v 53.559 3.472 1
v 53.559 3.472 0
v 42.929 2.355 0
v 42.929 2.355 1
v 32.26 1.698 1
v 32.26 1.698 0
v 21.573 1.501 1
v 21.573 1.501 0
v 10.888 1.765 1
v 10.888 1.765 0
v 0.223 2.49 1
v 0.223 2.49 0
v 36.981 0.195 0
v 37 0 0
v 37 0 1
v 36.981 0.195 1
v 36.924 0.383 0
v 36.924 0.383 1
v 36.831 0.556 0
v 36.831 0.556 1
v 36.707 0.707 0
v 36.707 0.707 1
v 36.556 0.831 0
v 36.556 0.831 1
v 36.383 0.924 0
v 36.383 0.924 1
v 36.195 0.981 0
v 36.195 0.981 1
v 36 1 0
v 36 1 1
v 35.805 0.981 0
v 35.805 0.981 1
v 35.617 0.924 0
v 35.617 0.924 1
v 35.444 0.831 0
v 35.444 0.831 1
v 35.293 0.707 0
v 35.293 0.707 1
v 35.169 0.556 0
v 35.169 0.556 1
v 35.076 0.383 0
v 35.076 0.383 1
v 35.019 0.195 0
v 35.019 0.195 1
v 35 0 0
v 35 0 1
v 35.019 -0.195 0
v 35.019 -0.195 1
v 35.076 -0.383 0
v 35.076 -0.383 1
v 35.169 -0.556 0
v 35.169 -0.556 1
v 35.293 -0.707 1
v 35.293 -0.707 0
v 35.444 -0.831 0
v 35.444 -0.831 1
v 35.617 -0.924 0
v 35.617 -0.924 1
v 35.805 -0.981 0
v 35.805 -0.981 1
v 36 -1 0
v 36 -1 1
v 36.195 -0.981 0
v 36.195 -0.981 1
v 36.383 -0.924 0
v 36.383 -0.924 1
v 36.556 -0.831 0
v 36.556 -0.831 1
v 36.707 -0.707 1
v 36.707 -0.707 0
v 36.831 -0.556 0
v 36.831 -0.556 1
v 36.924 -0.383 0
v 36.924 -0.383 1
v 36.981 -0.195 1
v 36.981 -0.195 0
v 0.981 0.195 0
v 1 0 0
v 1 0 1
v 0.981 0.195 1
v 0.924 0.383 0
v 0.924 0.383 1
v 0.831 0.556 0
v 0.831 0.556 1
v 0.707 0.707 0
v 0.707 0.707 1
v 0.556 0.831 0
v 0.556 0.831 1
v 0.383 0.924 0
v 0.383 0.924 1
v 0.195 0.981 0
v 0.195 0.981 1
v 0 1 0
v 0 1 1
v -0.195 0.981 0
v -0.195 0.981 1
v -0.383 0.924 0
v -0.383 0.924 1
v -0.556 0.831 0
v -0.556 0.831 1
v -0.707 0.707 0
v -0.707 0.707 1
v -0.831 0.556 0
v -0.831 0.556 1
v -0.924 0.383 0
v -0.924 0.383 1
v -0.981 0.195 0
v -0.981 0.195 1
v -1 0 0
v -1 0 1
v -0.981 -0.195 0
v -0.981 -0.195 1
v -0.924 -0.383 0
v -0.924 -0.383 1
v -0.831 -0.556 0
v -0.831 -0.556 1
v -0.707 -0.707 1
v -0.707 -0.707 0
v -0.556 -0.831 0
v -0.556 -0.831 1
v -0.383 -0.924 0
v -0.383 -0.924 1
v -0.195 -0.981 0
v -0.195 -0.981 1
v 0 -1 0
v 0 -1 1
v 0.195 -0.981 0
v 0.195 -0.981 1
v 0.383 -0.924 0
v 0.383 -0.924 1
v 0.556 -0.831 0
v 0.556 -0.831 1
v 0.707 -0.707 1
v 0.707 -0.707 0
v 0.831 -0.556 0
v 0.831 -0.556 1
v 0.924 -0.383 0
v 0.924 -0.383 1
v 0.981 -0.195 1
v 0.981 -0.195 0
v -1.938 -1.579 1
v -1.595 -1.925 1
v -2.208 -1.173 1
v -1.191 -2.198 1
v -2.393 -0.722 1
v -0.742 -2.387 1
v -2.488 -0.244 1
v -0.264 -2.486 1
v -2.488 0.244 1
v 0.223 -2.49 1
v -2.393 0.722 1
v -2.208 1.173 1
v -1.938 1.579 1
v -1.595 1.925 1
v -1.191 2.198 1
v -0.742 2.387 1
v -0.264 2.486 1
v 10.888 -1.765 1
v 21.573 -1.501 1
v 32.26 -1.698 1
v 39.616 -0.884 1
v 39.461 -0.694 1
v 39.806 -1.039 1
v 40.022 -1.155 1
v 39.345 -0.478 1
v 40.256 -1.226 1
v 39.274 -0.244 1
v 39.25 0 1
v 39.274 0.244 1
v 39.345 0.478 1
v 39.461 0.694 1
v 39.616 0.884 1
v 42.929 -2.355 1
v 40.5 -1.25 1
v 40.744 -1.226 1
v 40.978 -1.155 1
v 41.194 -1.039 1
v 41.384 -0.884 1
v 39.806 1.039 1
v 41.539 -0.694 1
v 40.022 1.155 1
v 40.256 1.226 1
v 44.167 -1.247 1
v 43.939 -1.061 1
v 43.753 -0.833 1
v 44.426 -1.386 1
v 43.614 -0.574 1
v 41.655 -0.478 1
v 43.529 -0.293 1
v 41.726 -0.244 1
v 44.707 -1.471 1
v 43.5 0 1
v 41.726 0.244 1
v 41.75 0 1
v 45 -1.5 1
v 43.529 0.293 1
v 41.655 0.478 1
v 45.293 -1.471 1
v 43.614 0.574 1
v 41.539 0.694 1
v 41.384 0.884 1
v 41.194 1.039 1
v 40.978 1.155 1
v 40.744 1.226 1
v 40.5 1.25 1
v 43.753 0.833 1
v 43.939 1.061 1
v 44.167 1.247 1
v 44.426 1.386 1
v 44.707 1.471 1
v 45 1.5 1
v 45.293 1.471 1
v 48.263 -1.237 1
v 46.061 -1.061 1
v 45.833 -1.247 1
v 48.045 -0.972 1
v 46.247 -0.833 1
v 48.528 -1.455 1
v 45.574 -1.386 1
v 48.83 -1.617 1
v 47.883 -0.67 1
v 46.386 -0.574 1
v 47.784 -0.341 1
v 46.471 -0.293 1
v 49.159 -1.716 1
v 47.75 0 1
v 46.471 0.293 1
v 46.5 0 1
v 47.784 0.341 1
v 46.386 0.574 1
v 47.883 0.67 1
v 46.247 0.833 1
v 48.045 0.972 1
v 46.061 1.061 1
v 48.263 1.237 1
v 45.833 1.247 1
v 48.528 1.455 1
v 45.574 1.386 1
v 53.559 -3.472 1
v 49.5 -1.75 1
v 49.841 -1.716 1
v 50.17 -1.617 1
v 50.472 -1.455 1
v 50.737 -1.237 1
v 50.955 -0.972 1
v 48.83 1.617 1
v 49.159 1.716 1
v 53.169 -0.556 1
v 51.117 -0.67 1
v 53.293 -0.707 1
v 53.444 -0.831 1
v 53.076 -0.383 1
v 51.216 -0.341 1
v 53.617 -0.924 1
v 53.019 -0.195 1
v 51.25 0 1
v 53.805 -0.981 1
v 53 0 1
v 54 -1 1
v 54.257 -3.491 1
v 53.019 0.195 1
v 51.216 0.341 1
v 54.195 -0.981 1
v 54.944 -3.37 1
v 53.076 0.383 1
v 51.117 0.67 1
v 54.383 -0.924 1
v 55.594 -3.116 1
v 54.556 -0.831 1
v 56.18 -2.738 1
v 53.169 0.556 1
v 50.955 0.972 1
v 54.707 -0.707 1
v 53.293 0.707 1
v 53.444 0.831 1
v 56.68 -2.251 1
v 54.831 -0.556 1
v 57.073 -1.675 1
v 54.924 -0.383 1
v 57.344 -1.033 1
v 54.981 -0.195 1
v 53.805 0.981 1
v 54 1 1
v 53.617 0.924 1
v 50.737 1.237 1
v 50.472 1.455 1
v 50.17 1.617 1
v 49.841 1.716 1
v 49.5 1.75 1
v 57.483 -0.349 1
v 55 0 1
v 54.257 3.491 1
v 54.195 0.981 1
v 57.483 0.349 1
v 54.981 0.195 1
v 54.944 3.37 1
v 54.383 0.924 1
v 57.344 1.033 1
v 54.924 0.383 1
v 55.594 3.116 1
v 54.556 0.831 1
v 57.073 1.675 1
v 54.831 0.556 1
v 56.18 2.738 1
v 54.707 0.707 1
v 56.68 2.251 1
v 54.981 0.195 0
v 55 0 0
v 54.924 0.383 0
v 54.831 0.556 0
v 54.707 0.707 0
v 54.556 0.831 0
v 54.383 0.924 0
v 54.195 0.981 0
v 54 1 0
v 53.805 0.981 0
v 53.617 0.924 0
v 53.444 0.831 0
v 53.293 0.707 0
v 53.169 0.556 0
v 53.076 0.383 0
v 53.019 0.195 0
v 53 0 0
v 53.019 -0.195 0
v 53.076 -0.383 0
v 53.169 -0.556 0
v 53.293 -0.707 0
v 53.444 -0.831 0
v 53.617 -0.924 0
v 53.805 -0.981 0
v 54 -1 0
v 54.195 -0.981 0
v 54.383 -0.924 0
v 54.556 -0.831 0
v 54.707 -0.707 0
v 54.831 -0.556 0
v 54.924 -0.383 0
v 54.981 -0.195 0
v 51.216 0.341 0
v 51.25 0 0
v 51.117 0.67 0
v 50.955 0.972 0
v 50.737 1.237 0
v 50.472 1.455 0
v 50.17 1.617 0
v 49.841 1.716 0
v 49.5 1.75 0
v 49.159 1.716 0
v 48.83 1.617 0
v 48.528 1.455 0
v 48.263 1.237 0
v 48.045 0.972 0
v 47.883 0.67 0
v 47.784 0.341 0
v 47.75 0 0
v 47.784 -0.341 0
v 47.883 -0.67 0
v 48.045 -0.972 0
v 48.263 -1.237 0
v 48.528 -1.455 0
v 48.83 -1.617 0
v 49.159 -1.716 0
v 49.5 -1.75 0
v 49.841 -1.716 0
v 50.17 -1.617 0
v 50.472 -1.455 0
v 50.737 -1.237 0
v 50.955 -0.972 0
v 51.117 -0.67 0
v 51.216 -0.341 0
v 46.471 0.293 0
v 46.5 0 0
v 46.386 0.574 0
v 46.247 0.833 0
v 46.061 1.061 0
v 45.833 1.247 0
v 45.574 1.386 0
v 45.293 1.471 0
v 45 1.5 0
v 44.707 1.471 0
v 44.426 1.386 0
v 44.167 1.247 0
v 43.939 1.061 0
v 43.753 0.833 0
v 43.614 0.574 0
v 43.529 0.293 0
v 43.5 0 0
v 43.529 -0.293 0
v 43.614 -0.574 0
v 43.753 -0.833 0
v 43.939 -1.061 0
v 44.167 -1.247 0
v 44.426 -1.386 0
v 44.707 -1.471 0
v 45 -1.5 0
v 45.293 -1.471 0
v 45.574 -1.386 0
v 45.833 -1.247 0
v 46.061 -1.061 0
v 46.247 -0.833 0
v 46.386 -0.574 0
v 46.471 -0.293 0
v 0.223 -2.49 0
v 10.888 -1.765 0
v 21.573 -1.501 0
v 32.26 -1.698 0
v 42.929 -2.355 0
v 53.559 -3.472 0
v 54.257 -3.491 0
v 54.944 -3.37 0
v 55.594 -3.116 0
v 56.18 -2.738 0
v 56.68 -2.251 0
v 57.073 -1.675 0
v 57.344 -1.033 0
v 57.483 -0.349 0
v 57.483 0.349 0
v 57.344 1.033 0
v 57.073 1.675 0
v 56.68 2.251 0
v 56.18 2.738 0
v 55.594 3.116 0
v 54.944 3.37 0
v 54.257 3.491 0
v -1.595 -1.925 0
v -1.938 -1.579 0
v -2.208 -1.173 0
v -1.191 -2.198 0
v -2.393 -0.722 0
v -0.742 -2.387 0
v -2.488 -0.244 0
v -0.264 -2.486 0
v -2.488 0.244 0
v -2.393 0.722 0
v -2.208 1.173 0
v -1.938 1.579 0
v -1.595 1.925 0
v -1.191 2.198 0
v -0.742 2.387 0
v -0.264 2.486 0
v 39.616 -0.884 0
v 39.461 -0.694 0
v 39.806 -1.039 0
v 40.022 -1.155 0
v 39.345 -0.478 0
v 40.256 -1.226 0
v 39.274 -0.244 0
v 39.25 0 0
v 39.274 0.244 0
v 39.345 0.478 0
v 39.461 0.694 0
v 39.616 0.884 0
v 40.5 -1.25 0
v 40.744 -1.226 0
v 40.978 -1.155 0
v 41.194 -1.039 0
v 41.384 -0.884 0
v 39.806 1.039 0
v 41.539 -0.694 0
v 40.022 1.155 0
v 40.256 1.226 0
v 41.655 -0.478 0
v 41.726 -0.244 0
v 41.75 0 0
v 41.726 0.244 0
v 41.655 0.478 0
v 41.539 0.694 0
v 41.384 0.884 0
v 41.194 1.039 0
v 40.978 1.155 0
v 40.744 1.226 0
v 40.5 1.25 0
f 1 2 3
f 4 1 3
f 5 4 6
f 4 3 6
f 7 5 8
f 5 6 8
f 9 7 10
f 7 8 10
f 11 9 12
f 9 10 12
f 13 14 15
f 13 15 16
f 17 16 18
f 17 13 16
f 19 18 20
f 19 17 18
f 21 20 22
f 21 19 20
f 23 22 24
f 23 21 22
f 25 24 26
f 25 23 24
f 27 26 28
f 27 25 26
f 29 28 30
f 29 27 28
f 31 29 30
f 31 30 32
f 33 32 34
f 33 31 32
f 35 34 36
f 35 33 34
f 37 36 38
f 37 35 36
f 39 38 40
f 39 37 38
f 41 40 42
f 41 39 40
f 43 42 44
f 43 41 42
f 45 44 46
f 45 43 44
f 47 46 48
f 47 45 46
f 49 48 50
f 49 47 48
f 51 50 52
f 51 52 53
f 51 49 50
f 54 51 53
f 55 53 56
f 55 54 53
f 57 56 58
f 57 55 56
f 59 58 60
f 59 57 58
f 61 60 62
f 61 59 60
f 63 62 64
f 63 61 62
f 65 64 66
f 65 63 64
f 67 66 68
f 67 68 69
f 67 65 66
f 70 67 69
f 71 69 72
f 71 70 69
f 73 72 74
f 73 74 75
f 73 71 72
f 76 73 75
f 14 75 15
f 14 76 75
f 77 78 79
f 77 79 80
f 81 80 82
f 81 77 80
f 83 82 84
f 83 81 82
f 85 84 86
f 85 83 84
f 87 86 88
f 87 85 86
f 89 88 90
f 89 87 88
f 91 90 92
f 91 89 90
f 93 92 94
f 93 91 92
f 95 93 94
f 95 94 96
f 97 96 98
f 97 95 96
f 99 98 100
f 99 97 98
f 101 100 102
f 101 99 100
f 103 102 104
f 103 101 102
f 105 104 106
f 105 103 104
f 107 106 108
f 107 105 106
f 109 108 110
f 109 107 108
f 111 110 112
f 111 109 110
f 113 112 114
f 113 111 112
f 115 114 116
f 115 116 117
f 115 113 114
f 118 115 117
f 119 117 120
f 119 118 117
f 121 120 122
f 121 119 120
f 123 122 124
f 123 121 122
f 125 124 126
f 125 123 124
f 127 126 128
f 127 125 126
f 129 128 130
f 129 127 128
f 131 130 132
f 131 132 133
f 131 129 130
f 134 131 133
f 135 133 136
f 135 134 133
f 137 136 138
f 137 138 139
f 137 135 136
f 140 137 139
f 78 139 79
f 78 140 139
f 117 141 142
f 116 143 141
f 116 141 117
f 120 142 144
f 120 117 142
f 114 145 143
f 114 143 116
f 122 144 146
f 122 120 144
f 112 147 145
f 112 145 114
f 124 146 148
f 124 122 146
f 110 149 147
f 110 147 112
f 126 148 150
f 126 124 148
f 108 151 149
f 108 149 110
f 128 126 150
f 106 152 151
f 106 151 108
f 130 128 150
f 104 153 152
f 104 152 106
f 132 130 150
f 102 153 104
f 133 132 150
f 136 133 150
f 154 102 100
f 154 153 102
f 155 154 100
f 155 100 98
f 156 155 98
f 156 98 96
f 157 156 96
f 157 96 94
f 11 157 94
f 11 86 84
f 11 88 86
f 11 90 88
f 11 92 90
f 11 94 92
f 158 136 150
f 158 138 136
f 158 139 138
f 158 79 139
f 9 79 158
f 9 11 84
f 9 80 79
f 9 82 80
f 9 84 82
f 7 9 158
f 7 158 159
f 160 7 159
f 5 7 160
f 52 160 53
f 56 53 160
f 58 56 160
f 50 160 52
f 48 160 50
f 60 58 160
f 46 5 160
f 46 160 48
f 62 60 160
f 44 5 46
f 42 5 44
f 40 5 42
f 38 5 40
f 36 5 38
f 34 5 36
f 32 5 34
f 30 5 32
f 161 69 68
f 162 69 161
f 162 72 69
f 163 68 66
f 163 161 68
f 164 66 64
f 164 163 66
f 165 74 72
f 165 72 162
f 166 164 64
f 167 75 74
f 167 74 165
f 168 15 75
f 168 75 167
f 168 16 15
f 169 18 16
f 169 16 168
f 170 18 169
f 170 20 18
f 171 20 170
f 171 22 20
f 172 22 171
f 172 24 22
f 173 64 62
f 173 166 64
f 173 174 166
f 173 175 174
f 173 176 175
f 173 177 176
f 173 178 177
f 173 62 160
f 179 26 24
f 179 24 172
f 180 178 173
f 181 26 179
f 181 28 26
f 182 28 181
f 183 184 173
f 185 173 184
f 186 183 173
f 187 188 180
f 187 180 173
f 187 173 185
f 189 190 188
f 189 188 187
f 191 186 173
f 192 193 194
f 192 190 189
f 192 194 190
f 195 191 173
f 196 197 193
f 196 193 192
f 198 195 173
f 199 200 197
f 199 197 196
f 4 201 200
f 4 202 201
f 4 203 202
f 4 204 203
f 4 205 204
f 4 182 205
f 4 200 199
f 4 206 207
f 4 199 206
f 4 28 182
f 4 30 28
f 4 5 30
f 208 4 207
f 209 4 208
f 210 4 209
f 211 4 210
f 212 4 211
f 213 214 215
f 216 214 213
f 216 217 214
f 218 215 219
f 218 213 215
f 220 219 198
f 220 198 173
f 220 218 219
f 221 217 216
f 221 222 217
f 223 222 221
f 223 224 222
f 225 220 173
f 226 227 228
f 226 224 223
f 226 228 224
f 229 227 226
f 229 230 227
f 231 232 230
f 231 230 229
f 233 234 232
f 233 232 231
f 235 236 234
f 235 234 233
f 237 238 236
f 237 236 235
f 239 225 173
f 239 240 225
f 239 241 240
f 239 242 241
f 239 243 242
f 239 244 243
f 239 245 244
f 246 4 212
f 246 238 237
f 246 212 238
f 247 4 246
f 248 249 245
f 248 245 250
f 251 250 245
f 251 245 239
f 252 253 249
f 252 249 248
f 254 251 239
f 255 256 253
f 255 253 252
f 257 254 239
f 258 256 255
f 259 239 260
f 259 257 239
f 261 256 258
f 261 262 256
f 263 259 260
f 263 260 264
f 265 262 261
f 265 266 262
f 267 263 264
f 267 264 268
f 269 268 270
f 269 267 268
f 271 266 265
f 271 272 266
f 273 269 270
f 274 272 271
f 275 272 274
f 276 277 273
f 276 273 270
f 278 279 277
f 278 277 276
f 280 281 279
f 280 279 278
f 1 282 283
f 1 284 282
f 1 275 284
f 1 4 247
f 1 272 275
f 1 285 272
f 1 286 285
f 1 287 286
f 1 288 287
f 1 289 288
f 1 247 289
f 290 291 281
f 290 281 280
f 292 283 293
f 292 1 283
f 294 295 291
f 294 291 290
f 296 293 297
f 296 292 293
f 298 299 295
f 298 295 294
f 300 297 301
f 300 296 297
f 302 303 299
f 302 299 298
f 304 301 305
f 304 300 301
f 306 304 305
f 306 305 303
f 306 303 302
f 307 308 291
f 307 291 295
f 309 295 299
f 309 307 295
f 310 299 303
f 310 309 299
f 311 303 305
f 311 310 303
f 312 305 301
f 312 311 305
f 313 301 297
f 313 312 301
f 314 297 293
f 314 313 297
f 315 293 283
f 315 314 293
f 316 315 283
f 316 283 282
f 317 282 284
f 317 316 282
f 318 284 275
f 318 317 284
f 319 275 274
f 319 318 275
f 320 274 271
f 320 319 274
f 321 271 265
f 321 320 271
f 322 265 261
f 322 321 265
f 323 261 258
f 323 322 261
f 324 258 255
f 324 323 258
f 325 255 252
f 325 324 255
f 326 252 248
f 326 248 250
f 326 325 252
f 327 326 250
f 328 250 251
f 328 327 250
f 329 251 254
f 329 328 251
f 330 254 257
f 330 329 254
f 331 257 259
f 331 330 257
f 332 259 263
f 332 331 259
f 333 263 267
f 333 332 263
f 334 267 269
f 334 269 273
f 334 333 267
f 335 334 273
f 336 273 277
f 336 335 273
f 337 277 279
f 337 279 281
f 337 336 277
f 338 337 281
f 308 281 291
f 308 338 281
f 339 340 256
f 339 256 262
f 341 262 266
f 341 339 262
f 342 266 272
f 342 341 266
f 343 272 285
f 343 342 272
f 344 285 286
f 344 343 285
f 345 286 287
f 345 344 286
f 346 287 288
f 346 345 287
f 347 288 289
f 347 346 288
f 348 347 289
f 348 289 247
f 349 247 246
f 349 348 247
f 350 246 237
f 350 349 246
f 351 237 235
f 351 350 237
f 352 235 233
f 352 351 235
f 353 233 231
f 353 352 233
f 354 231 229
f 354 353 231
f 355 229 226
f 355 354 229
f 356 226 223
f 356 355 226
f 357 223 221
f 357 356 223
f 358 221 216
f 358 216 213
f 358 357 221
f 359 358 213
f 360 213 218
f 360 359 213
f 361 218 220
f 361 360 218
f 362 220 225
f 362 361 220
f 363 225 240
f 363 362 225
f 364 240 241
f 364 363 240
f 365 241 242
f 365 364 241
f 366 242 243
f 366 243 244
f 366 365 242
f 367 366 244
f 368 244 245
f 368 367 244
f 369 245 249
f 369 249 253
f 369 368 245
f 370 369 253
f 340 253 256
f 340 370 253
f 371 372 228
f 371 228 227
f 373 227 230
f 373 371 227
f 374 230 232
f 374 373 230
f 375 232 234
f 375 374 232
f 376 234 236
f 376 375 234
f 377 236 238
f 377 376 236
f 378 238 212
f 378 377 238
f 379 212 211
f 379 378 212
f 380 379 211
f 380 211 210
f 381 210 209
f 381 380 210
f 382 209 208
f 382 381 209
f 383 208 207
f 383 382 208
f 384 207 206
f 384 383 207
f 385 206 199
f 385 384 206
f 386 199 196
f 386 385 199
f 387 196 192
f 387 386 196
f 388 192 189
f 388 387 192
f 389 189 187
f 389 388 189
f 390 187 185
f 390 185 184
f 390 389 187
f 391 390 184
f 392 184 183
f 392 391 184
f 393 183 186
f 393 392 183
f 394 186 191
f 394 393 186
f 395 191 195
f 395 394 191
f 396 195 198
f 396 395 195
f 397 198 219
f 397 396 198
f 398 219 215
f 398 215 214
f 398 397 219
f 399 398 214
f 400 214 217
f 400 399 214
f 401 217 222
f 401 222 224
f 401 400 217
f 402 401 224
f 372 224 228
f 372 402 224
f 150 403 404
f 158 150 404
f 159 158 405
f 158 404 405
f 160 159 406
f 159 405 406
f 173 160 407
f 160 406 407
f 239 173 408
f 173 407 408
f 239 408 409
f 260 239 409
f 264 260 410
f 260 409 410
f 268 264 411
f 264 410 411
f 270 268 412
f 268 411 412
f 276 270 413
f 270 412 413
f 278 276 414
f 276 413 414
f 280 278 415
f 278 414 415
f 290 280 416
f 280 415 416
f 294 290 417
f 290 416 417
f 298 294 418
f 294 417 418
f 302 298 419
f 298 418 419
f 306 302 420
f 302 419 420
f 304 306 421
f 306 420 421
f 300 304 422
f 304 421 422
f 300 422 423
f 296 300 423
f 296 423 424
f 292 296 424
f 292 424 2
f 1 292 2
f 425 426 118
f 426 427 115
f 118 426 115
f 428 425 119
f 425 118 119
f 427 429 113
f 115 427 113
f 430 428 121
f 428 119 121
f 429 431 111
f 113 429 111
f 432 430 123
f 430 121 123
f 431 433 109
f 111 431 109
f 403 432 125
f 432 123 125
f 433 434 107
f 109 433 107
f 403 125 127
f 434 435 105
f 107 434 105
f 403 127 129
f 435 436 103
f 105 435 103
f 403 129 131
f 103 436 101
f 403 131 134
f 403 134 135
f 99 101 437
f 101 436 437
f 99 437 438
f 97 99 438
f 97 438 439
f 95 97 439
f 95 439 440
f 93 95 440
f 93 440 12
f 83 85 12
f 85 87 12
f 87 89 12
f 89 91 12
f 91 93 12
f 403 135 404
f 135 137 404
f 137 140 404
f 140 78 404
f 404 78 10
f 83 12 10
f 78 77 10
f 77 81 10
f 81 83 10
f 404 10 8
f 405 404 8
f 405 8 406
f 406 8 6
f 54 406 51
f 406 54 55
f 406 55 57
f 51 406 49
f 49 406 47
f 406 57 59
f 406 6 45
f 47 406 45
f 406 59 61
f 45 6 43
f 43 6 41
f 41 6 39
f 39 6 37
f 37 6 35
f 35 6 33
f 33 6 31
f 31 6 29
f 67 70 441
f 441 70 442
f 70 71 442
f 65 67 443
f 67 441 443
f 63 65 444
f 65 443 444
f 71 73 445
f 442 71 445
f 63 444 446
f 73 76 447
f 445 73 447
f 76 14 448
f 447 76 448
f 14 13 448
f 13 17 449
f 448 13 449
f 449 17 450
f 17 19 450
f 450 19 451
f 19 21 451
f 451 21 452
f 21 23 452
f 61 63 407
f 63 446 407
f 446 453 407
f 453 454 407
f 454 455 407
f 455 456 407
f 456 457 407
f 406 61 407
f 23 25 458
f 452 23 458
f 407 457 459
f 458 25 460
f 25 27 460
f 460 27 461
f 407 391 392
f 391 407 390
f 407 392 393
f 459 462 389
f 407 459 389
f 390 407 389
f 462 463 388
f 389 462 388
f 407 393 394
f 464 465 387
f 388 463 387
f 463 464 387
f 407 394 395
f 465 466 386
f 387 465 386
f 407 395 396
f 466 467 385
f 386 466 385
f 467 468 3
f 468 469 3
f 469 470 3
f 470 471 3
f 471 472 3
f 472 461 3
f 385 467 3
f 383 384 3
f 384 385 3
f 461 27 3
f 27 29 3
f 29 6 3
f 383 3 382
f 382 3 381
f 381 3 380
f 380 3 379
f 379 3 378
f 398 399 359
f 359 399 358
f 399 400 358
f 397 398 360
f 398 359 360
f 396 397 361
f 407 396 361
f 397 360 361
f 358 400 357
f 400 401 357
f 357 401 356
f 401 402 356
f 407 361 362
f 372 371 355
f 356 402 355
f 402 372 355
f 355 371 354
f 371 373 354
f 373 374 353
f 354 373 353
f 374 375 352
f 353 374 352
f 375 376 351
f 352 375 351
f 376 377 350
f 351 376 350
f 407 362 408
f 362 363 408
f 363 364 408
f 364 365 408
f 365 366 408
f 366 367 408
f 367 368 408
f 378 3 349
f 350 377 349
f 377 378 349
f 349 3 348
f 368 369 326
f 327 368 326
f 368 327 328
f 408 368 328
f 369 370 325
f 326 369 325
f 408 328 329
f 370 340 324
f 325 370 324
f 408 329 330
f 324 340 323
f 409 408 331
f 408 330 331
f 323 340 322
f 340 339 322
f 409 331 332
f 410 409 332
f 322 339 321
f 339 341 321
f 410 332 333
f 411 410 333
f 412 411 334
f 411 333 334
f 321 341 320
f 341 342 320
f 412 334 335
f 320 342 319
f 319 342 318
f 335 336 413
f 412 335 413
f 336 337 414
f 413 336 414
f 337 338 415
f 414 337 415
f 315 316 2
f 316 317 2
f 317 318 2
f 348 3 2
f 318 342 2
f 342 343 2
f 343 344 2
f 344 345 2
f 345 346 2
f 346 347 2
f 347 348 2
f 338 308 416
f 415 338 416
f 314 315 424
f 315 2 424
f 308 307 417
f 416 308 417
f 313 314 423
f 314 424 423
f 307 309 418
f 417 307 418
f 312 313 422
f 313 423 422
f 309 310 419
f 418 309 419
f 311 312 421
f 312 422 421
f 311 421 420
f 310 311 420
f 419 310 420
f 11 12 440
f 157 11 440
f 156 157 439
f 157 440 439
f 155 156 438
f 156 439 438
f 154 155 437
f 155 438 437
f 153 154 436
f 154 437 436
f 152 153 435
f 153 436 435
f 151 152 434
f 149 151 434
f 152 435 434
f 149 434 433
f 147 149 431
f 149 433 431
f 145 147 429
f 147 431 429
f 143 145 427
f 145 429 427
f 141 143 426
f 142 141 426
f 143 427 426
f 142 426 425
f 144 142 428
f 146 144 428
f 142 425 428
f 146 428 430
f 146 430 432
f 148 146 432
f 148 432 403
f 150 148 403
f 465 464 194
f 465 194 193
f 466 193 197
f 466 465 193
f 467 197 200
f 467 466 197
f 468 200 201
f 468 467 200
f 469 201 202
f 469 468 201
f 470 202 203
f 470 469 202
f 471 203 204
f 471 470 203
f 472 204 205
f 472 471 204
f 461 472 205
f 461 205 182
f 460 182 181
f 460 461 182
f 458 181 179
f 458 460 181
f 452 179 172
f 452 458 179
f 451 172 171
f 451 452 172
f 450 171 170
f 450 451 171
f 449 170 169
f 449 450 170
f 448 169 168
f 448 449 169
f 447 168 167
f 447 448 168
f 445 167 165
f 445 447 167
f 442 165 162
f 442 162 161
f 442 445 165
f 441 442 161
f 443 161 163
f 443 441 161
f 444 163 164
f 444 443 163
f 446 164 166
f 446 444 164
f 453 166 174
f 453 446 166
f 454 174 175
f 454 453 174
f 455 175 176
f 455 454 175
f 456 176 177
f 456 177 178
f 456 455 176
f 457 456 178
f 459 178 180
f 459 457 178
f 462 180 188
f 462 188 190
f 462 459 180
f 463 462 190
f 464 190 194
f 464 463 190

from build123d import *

# Parameters (mm, degrees)
SKETCH_1_R      = 1
SKETCH_1_R_2    = 1.75
SKETCH_1_R_3    = 1.5
SKETCH_1_R_4    = 1.25
EXTRUDE_1_DEPTH = 1


with BuildPart() as part:
    # 草图1 → 凸台-拉伸1 (new body)
    with BuildSketch(Plane.XY):
        with BuildLine():
            ThreePointArc((0.223222552, 2.490014396), (-2.5, 0), (0.223222552, -2.490014396))
            ThreePointArc((0.223222552, -2.490014396), (26.917790455, -1.542011473), (53.559359935, -3.472151542))
            ThreePointArc((53.559359935, -3.472151542), (57.5, 0), (53.559359935, 3.472151542))
            ThreePointArc((53.559359935, 3.472151542), (26.917790455, 1.542011473), (0.223222552, 2.490014396))
        make_face()
        Circle(SKETCH_1_R, mode=Mode.SUBTRACT)
        with Locations((54, 0)):
            Circle(SKETCH_1_R, mode=Mode.SUBTRACT)
        with Locations((49.5, 0)):
            Circle(SKETCH_1_R_2, mode=Mode.SUBTRACT)
        with Locations((45, 0)):
            Circle(SKETCH_1_R_3, mode=Mode.SUBTRACT)
        with Locations((40.5, 0)):
            Circle(SKETCH_1_R_4, mode=Mode.SUBTRACT)
        with Locations((36, 0)):
            Circle(SKETCH_1_R, mode=Mode.SUBTRACT)
    extrude(amount=EXTRUDE_1_DEPTH)


solid = part.part
